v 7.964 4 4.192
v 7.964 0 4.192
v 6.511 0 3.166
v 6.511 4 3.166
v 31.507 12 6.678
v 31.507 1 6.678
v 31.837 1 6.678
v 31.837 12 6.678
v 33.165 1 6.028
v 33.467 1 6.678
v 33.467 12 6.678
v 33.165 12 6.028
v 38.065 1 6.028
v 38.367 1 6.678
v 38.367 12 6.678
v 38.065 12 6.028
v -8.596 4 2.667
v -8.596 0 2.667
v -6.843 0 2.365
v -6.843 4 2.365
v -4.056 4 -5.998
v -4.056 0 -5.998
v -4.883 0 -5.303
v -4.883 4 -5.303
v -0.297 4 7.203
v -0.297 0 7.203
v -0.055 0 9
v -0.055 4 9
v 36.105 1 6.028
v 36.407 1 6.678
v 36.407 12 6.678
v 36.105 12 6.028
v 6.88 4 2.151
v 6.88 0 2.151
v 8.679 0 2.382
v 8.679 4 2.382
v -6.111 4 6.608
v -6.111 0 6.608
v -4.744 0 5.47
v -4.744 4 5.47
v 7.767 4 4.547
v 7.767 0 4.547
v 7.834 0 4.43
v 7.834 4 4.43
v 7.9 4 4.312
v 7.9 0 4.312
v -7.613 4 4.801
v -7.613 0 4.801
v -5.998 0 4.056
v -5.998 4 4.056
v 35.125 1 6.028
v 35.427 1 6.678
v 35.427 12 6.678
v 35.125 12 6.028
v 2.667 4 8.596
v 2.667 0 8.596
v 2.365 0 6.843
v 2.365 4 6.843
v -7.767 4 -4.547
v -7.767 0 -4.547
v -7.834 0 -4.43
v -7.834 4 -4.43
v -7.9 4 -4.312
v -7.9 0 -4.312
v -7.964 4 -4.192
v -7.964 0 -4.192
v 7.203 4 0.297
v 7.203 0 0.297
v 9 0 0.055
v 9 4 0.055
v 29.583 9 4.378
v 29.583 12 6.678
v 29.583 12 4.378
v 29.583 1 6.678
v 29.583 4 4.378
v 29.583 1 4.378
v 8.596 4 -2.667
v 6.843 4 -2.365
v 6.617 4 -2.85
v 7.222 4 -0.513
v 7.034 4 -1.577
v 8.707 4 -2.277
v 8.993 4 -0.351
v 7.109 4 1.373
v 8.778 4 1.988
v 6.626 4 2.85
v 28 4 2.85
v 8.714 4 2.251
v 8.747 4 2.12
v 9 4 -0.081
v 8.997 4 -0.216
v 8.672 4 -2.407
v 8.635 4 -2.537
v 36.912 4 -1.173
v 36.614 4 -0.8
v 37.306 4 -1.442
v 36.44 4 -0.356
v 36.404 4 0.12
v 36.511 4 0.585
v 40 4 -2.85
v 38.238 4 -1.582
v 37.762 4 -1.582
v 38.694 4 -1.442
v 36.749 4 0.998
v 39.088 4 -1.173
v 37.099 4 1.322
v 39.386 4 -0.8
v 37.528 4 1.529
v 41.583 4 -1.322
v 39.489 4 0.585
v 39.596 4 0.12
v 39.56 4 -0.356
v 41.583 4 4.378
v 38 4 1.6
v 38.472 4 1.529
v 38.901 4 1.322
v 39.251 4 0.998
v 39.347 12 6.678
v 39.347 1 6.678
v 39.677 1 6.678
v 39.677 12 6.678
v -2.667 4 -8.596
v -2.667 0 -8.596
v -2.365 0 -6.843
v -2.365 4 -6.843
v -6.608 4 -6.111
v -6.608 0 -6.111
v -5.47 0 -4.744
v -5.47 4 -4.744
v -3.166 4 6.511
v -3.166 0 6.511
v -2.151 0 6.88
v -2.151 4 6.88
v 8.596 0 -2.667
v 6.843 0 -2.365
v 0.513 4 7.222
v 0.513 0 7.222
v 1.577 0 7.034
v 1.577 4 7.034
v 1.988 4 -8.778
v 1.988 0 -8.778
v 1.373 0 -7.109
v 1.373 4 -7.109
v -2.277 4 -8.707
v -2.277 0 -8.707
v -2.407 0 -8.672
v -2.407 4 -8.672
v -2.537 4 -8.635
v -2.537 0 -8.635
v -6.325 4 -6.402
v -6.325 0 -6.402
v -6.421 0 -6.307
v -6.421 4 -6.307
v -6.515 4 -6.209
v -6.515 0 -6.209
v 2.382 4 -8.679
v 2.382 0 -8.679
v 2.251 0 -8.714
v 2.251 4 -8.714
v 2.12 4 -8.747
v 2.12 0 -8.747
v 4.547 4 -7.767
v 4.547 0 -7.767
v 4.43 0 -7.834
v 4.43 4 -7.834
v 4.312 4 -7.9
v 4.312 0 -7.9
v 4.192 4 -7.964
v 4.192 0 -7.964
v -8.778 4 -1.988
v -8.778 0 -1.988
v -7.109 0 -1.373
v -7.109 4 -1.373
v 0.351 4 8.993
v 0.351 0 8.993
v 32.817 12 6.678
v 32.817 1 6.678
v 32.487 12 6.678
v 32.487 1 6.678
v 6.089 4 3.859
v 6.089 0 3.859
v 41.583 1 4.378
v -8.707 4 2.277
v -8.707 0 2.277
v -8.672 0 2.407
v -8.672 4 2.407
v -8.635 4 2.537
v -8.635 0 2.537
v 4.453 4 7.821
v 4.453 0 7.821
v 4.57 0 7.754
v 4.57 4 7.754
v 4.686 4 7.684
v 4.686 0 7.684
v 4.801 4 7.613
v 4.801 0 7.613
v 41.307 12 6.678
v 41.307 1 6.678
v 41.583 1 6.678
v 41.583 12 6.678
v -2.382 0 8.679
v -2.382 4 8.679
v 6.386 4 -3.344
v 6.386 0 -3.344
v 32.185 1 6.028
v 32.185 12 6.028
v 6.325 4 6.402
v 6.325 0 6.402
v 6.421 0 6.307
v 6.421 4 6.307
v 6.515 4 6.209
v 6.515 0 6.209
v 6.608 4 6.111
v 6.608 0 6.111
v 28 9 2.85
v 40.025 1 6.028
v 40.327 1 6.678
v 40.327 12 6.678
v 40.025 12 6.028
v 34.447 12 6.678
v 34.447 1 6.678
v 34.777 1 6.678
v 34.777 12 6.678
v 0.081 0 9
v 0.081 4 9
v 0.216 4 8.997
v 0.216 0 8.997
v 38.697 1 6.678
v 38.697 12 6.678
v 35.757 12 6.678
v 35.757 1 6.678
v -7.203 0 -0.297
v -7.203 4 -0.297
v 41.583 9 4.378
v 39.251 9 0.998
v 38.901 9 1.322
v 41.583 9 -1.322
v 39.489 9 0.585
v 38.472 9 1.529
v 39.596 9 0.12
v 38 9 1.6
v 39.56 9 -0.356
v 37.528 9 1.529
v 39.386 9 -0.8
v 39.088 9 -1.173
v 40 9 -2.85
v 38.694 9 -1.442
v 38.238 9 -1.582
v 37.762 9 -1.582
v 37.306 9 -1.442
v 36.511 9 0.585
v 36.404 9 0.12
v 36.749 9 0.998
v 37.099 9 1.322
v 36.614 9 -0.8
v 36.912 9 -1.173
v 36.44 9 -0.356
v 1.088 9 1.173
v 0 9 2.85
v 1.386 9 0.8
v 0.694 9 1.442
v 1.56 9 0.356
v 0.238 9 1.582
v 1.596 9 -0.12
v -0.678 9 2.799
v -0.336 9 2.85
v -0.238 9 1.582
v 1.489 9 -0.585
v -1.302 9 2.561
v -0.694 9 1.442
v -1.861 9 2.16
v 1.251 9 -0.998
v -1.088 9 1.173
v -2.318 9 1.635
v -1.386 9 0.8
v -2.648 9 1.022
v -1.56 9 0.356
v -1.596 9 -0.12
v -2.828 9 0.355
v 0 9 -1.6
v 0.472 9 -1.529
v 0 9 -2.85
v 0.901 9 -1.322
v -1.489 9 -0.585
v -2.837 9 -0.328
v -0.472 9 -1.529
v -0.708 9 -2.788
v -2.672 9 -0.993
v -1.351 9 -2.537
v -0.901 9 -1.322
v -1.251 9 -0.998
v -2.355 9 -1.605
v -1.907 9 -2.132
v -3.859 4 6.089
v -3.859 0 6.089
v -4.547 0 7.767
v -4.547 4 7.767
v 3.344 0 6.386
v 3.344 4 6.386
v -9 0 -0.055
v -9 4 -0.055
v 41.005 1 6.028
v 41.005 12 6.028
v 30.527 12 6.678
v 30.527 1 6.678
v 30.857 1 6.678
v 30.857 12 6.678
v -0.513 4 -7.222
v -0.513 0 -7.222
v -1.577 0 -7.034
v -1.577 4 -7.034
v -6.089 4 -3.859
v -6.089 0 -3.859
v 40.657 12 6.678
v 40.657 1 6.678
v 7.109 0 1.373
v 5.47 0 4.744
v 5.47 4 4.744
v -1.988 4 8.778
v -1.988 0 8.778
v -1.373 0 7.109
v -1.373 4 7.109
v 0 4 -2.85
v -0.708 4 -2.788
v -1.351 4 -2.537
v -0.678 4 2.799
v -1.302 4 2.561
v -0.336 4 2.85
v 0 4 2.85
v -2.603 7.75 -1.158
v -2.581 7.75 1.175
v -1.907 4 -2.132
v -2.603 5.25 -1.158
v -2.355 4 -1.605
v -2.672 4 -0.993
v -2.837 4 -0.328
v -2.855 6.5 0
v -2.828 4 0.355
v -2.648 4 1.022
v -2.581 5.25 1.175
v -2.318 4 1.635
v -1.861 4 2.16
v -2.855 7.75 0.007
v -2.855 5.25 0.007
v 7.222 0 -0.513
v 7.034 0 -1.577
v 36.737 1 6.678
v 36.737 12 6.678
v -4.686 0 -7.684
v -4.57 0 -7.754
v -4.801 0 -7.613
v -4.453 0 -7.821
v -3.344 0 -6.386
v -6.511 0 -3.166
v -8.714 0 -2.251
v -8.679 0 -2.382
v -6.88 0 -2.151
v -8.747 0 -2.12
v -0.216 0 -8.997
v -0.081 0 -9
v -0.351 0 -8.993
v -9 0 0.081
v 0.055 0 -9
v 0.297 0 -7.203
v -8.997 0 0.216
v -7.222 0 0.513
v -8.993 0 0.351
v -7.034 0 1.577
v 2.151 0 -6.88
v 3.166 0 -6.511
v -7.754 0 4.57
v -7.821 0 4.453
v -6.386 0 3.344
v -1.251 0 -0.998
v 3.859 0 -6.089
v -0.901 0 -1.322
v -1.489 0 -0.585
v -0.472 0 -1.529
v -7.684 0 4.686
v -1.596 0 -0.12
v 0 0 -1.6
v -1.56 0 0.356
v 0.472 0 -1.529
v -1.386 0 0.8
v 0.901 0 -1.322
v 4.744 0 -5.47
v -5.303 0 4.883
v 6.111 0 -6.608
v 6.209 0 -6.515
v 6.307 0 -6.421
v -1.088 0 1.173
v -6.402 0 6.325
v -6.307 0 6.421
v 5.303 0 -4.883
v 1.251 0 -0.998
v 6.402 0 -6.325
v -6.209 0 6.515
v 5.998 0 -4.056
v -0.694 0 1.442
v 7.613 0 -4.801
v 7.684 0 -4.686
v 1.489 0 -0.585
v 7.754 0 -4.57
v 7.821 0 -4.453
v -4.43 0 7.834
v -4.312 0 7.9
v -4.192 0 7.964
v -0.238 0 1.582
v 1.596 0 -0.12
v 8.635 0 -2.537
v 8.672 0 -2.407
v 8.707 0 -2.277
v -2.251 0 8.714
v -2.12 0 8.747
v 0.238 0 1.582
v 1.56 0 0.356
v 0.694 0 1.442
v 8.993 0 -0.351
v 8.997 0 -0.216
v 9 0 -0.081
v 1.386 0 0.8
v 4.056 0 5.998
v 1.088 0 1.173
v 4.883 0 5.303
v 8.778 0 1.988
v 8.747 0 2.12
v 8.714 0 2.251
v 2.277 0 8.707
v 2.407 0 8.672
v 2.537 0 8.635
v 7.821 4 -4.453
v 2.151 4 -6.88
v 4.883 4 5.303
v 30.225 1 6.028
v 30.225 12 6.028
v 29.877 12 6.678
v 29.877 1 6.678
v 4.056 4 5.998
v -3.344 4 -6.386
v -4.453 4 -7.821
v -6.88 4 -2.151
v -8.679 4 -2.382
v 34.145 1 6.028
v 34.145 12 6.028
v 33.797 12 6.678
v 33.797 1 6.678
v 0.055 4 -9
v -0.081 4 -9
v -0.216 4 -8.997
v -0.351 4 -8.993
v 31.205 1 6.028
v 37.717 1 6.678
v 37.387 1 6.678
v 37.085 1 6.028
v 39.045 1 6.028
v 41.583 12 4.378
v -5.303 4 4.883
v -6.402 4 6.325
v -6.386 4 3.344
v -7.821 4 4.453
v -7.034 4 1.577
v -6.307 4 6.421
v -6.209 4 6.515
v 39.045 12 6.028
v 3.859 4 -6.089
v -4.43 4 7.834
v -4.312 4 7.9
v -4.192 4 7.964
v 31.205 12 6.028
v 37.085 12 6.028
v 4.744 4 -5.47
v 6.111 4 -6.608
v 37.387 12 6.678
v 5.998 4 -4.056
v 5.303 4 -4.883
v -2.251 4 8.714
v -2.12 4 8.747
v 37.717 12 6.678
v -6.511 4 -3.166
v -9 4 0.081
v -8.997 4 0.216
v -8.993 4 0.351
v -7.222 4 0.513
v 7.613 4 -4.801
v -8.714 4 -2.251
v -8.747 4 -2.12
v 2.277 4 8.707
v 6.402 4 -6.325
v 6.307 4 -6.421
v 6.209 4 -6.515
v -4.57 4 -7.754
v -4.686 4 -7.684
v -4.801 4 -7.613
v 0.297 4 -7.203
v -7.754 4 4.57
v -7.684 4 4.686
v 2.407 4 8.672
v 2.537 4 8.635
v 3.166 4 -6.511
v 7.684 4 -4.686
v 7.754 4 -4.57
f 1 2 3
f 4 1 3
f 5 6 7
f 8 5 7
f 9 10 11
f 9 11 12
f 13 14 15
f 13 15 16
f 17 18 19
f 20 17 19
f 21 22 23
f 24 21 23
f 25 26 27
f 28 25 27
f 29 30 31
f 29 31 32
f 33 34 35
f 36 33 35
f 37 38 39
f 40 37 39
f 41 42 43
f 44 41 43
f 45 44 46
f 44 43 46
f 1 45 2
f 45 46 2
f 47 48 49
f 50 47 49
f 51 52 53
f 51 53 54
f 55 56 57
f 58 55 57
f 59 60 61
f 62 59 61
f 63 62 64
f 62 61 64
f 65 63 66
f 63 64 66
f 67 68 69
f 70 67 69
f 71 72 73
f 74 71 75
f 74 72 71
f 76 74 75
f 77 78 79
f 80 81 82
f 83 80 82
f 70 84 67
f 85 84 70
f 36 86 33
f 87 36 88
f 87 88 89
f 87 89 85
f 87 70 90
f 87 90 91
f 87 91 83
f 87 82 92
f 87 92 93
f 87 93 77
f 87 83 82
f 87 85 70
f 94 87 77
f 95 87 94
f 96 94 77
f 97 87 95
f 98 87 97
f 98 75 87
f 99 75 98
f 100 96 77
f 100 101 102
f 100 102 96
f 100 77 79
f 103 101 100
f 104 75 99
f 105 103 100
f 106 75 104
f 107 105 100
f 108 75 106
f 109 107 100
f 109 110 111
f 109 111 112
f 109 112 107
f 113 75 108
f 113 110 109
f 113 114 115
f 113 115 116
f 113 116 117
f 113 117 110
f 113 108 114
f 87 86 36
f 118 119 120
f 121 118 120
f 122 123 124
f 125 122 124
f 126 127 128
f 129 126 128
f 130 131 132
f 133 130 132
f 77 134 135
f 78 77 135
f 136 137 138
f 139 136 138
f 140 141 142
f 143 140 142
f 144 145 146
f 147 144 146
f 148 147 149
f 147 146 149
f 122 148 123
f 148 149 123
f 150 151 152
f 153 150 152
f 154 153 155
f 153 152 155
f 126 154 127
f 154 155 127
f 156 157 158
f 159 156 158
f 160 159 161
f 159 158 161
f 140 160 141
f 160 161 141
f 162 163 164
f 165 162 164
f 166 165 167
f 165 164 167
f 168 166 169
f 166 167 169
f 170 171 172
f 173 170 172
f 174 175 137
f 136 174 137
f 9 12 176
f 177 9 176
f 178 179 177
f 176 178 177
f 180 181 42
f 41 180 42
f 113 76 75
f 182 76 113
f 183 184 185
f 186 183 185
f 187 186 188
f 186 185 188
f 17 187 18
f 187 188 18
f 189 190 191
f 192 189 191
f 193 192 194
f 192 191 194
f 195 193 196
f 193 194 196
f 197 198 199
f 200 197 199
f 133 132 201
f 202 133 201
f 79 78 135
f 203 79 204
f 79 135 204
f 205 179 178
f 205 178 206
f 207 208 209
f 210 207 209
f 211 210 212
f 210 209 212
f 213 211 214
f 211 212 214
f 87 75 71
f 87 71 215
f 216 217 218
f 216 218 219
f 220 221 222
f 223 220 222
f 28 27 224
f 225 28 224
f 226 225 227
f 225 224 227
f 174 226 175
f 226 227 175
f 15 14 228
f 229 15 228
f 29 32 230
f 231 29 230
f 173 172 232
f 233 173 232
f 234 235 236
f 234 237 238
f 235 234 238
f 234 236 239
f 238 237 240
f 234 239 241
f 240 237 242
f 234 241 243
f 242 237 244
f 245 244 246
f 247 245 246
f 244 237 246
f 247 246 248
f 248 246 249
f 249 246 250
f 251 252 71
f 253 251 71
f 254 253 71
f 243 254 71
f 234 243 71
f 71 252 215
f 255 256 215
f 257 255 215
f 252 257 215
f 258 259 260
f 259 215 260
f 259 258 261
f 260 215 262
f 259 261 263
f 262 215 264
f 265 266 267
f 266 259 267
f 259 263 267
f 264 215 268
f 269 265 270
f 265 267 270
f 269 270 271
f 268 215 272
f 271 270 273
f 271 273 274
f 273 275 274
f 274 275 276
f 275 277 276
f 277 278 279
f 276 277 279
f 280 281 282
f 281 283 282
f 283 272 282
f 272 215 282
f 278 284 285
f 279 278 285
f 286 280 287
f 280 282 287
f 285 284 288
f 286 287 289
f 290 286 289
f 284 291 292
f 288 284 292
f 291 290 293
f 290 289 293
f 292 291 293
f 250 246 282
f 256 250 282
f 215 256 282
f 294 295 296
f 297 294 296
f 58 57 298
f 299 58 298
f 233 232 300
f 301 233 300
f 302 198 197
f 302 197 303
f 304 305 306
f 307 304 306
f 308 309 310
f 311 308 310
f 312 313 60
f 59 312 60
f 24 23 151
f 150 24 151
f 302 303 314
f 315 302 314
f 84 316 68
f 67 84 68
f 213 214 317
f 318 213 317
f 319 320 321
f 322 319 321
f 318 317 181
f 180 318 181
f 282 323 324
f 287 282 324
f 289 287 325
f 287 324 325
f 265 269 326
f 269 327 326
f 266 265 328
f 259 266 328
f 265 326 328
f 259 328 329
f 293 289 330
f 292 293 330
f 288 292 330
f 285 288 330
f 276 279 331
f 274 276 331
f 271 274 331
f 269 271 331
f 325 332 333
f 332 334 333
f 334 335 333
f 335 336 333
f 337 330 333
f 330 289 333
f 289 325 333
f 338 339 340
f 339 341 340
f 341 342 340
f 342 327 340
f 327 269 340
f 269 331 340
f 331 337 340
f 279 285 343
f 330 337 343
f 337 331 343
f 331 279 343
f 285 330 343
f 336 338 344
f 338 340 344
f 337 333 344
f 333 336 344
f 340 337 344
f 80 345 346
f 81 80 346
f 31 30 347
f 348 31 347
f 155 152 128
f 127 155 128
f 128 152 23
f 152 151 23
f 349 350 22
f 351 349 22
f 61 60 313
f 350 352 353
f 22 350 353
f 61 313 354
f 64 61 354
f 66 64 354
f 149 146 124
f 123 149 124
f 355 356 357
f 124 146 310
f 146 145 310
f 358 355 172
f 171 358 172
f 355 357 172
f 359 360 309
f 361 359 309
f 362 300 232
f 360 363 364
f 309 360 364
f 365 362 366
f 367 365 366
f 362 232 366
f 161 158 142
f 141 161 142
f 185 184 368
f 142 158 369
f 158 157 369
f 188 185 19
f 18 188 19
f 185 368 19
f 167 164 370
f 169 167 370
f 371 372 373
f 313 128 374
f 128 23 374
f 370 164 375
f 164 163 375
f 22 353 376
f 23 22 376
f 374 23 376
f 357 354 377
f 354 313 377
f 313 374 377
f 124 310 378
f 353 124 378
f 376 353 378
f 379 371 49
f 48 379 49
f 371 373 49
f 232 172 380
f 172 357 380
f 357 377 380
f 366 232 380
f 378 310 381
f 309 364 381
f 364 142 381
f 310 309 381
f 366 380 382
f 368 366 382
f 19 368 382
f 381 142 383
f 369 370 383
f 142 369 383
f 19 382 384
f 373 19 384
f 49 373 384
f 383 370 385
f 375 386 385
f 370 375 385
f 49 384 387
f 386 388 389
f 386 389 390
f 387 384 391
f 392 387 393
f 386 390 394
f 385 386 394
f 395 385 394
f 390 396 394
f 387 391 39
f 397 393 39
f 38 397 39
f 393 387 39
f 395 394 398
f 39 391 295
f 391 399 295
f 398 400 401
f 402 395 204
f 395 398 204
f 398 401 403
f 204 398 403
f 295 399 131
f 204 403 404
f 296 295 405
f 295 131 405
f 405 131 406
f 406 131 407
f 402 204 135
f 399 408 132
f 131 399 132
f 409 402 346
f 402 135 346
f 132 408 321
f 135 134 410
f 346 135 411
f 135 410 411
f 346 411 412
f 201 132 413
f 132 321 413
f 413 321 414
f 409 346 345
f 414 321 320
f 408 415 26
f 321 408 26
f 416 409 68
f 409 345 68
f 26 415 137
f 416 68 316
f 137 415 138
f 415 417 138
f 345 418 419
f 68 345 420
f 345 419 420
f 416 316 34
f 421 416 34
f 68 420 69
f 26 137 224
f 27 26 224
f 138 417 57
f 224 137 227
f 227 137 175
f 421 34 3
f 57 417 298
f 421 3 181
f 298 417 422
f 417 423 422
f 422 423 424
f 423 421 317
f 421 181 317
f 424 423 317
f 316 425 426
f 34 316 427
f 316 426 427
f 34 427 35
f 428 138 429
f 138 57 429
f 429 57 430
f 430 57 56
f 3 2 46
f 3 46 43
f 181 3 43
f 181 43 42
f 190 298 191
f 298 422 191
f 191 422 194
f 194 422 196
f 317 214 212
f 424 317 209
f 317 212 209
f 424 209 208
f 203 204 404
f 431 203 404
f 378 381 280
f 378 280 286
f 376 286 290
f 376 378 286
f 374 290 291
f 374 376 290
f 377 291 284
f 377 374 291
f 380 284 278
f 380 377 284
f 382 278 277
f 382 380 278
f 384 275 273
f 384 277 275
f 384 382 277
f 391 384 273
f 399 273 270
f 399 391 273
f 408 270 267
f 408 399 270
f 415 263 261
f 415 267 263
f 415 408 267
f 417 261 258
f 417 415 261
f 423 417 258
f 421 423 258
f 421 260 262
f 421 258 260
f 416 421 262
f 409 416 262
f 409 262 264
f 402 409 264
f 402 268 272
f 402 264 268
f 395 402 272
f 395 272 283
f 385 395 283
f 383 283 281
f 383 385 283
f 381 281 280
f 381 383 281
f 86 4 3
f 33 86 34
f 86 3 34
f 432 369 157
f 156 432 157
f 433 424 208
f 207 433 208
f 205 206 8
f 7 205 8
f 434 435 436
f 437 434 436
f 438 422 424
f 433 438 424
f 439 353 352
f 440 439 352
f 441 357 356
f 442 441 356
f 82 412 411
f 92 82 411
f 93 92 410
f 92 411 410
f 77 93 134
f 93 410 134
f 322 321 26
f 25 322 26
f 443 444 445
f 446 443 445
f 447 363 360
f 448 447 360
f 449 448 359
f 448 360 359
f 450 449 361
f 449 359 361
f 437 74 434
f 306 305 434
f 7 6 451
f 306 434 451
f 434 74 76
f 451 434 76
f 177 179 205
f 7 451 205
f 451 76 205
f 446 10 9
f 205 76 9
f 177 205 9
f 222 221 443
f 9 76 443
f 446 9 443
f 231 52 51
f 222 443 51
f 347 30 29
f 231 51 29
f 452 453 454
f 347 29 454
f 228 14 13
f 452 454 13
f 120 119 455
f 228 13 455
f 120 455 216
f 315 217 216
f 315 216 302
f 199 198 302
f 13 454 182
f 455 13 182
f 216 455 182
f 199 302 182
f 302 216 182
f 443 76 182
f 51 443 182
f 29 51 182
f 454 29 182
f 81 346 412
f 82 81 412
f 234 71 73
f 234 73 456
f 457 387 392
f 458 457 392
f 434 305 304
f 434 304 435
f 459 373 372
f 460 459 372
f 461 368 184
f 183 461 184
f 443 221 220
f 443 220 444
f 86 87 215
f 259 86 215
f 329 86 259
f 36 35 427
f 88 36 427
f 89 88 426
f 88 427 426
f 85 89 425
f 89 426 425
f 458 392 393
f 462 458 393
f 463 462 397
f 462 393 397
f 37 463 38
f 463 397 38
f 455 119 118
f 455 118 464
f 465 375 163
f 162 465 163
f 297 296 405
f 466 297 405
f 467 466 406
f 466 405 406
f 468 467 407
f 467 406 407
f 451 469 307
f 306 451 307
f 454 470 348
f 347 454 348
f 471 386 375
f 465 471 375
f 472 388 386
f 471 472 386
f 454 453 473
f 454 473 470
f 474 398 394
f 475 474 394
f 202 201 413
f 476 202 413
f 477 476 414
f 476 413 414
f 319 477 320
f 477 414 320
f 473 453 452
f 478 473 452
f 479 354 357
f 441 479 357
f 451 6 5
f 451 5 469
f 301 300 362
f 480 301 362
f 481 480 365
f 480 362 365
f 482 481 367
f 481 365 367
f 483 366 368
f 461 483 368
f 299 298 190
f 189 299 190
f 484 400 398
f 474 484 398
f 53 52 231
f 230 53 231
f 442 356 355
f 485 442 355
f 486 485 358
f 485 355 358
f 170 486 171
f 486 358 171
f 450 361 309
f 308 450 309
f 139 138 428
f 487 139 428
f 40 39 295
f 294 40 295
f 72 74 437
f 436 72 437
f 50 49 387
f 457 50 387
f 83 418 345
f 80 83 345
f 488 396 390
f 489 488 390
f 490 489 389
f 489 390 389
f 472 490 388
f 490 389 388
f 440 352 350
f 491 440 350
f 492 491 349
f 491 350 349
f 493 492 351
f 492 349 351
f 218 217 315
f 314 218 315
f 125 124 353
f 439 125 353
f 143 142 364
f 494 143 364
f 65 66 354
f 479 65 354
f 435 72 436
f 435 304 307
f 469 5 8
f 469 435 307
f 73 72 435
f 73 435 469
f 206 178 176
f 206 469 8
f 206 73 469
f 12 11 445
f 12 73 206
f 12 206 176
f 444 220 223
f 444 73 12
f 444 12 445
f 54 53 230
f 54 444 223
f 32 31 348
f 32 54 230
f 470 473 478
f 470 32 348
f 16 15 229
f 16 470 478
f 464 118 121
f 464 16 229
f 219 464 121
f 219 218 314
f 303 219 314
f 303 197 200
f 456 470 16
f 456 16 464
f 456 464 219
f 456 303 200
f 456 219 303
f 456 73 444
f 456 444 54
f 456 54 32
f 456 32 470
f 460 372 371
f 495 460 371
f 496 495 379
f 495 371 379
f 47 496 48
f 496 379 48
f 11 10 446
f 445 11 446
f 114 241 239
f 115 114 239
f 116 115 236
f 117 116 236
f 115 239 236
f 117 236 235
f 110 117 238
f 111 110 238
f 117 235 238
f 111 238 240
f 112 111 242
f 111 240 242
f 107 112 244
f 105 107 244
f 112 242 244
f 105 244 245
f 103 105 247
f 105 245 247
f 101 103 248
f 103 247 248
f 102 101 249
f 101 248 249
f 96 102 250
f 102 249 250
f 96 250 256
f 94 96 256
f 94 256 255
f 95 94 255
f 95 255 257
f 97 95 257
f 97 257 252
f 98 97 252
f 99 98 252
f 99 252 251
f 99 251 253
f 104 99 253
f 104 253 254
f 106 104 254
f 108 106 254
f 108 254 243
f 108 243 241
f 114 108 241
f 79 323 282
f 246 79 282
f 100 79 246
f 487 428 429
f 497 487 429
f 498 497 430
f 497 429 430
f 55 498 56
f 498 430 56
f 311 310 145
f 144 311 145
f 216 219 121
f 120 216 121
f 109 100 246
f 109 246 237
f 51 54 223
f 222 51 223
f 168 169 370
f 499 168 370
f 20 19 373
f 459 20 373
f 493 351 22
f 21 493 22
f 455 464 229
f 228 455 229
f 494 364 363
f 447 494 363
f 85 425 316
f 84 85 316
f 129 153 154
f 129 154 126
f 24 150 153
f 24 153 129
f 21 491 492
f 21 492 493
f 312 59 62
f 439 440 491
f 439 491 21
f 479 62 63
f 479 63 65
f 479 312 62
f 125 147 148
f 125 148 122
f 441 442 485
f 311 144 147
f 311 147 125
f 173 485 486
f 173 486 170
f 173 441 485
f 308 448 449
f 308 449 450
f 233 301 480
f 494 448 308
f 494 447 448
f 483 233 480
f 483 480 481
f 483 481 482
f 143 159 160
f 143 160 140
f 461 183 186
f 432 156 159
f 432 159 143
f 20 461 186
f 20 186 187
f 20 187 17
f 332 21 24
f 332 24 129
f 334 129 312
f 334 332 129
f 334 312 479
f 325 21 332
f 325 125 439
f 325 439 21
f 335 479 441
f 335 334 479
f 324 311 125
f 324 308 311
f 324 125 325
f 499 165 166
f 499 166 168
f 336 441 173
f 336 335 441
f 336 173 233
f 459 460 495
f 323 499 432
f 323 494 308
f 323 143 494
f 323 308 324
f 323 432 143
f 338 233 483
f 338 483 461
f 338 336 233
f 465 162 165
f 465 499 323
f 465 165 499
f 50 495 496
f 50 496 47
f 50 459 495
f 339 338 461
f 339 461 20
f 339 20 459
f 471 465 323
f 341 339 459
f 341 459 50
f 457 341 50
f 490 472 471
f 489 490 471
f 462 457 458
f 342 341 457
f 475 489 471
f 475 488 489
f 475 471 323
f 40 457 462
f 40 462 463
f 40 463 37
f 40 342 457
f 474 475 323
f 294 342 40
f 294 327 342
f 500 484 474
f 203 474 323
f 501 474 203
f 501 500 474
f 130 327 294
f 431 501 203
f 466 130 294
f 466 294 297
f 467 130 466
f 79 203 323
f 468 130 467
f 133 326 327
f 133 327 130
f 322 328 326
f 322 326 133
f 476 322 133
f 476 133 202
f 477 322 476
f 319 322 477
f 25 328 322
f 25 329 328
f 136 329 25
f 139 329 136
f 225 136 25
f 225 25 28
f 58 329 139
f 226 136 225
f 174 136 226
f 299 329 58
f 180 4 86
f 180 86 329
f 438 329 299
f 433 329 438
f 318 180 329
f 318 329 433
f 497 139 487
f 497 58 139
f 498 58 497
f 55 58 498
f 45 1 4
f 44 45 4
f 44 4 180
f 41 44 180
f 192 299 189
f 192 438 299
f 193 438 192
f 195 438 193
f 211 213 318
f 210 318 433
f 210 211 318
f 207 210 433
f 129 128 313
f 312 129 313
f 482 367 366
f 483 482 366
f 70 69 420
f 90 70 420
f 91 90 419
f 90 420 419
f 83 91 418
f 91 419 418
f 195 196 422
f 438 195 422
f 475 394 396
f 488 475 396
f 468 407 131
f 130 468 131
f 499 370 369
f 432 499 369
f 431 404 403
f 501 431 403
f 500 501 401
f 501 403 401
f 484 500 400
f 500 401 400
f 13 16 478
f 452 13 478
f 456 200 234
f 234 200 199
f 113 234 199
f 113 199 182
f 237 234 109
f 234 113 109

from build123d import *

# Parameters (mm, degrees)
ESQUISSE1_R                  = 9
BOSS_EXTRU_1_DEPTH           = 4
BOSS_EXTRU_2_DEPTH           = 5
ENL_V_MAT_EXTRU_1_DEPTH      = 4
ENL_V_MAT_EXTRU_2_DEPTH      = 3
ENL_V_MAT_EXTRU_2_DEPTH_BACK = 12
ESQUISSE4_R                  = 1.6
BOSS_EXTRU_3_DEPTH           = 3
BOSS_EXTRU_3_DEPTH_BACK      = 8
ESQUISSE5_W                  = 12
ESQUISSE5_H                  = 2.3
ENL_V_MAT_EXTRU_3_DEPTH      = 11
ESQUISSE7_R                  = 1.6
ENL_V_MAT_EXTRU_4_DEPTH      = 11


with BuildPart() as part:
    # Esquisse1 → Boss.-Extru.1 (new body)
    with BuildSketch(Plane(origin=(0, 0, 0), x_dir=(1, 0, 0), z_dir=(0, 1, 0))):
        with Locations(Location((0, 0, 0), (0, 0, 270))):
            Circle(ESQUISSE1_R)
    extrude(amount=BOSS_EXTRU_1_DEPTH)

    # Esquisse2 → Boss.-Extru.2 (add)
    with BuildSketch(Plane(origin=(0, 4, 0), x_dir=(1, 0, 0), z_dir=(0, 1, 0))):
        with BuildLine():
            Line((0, 2.85), (28, 2.85))
            Line((28, 2.85), (40, 2.85))
            Line((40, 2.85), (41.582547561, 1.321751585))
            Line((41.582547561, 1.321751585), (41.582547561, -6.678248415))
            Line((41.582547561, -6.678248415), (29.582547561, -6.678248415))
            Line((29.582547561, -6.678248415), (29.582547561, -4.378248415))
            Line((29.582547561, -4.378248415), (28, -2.85))
            Line((28, -2.85), (0, -2.85))
            add(Edge.make_bspline(
                [(0, 2.85), (-1.583763235, 2.944784931), (-4.146375178, 0.014422281), (-1.543874763, -2.966253476), (0, -2.85)],
                knots=[0, 0, 0, 0, 0.500311959, 1, 1, 1, 1], degree=3))
        make_face()
    extrude(amount=BOSS_EXTRU_2_DEPTH)

    # Esquisse3 → Enlèv. mat.-Extru.1 (cut)
    with BuildSketch(Plane.XZ):
        Polygon((0.351449311, 8.993135348), (0.513444021, 7.221842901), (1.577304258, 7.034102859), (2.276601179, 8.707300791), (1.416805586, 9.582955874), align=None)
        Polygon((3.344118704, 6.386185235), (4.452643151, 7.821378969), (3.848780595, 8.889728302), (2.667068669, 8.595739917), (2.365099324, 6.84287548), align=None)
        Polygon((4.883036987, 5.30305964), (6.325244851, 6.402443094), (6.018467567, 7.590680437), (4.800931705, 7.612559016), (4.055577016, 5.997577404), align=None)
        Polygon((6.089184369, 3.858539294), (7.766791567, 4.547191304), (7.77800592, 5.774340245), (6.607619179, 6.110594798), (5.469673837, 4.743554339), align=None)
        Polygon((6.880363898, 2.151065872), (8.679044273, 2.382055941), (9.007486024, 3.564488307), (7.964008326, 4.192203643), (6.511021425, 3.166265885), align=None)
        Polygon((7.202657999, 0.297000866), (8.999834455, 0.054587401), (9.62312084, 1.111722382), (8.777663467, 1.988120738), (7.108653663, 1.373201643), align=None)
        Polygon((7.034102859, -1.577304258), (8.707300791, -2.276601179), (9.582955874, -1.416805586), (8.993135348, -0.351449311), (7.221842901, -0.513444021), align=None)
        Polygon((6.386185235, -3.344118704), (7.821378969, -4.452643151), (8.889728302, -3.848780595), (8.595739917, -2.667068669), (6.84287548, -2.365099324), align=None)
        Polygon((5.30305964, -4.883036987), (6.402443094, -6.325244851), (7.590680437, -6.018467567), (7.612559016, -4.800931705), (5.997577404, -4.055577016), align=None)
        Polygon((3.858539294, -6.089184369), (4.547191304, -7.766791567), (5.774340245, -7.77800592), (6.110594798, -6.607619179), (4.743554339, -5.469673837), align=None)
        Polygon((2.151065872, -6.880363898), (2.382055941, -8.679044273), (3.564488307, -9.007486024), (4.192203643, -7.964008326), (3.166265885, -6.511021425), align=None)
        Polygon((0.297000866, -7.202657999), (0.054587401, -8.999834455), (1.111722382, -9.62312084), (1.988120738, -8.777663467), (1.373201643, -7.108653663), align=None)
        Polygon((-1.577304258, -7.034102859), (-2.276601179, -8.707300791), (-1.416805586, -9.582955874), (-0.351449311, -8.993135348), (-0.513444021, -7.221842901), align=None)
        Polygon((-3.344118704, -6.386185235), (-4.452643151, -7.821378969), (-3.848780595, -8.889728302), (-2.667068669, -8.595739917), (-2.365099324, -6.84287548), align=None)
        Polygon((-4.883036987, -5.30305964), (-6.325244851, -6.402443094), (-6.018467567, -7.590680437), (-4.800931705, -7.612559016), (-4.055577016, -5.997577404), align=None)
        Polygon((-6.089184369, -3.858539294), (-7.766791567, -4.547191304), (-7.77800592, -5.774340245), (-6.607619179, -6.110594798), (-5.469673837, -4.743554339), align=None)
        Polygon((-6.880363898, -2.151065872), (-8.679044273, -2.382055941), (-9.007486024, -3.564488307), (-7.964008326, -4.192203643), (-6.511021425, -3.166265885), align=None)
        Polygon((-7.202657999, -0.297000866), (-8.999834455, -0.054587401), (-9.62312084, -1.111722382), (-8.777663467, -1.988120738), (-7.108653663, -1.373201643), align=None)
        Polygon((-7.034102859, 1.577304258), (-8.707300791, 2.276601179), (-9.582955874, 1.416805586), (-8.993135348, 0.351449311), (-7.221842901, 0.513444021), align=None)
        Polygon((-6.386185235, 3.344118704), (-7.821378969, 4.452643151), (-8.889728302, 3.848780595), (-8.595739917, 2.667068669), (-6.84287548, 2.365099324), align=None)
        Polygon((-5.30305964, 4.883036987), (-6.402443094, 6.325244851), (-7.590680437, 6.018467567), (-7.612559016, 4.800931705), (-5.997577404, 4.055577016), align=None)
        Polygon((-3.858539294, 6.089184369), (-4.547191304, 7.766791567), (-5.774340245, 7.77800592), (-6.110594798, 6.607619179), (-4.743554339, 5.469673837), align=None)
        Polygon((-2.151065872, 6.880363898), (-2.382055941, 8.679044273), (-3.564488307, 9.007486024), (-4.192203643, 7.964008326), (-3.166265885, 6.511021425), align=None)
        Polygon((-0.297000866, 7.202657999), (-0.054587401, 8.999834455), (-1.111722382, 9.62312084), (-1.988120738, 8.777663467), (-1.373201643, 7.108653663), align=None)
    extrude(amount=-ENL_V_MAT_EXTRU_1_DEPTH, mode=Mode.SUBTRACT)

    # Esquisse4 → Enlèv. mat.-Extru.2 (cut, two sides: drawn at the far end of the back side and taken through both)
    with BuildSketch(Plane(origin=(0, 9, 0), x_dir=(1, 0, 0), z_dir=(0, 1, 0)).offset(-ENL_V_MAT_EXTRU_2_DEPTH_BACK)):
        with Locations(Location((0, 0, 0), (0, 0, 90))):
            Circle(ESQUISSE4_R)
    extrude(amount=ENL_V_MAT_EXTRU_2_DEPTH + ENL_V_MAT_EXTRU_2_DEPTH_BACK, mode=Mode.SUBTRACT)

    # Esquisse5 → Boss.-Extru.3 (add, two sides: drawn at the far end of the back side and taken through both)
    with BuildSketch(Plane(origin=(0, 9, 0), x_dir=(1, 0, 0), z_dir=(0, 1, 0)).offset(-BOSS_EXTRU_3_DEPTH_BACK)):
        with Locations((35.582547561, -5.528248415)):
            Rectangle(ESQUISSE5_W, ESQUISSE5_H)
    extrude(amount=BOSS_EXTRU_3_DEPTH + BOSS_EXTRU_3_DEPTH_BACK)

    # Esquisse6 → Enlèv. mat.-Extru.3 (cut)
    with BuildSketch(Plane(origin=(0, 12, 0), x_dir=(1, 0, 0), z_dir=(0, 1, 0))):
        Polygon((41.30726734, -6.678248415), (41.004659891, -6.028248415), (40.65726734, -6.678248415), (41.004659891, -7.030774788), align=None)
        Polygon((40.32726734, -6.678248415), (40.024659891, -6.028248415), (39.67726734, -6.678248415), (40.024659891, -7.030774788), align=None)
        Polygon((39.34726734, -6.678248415), (39.044659891, -6.028248415), (38.69726734, -6.678248415), (39.044659891, -7.030774788), align=None)
        Polygon((38.36726734, -6.678248415), (38.064659891, -6.028248415), (37.71726734, -6.678248415), (38.064659891, -7.030774788), align=None)
        Polygon((37.38726734, -6.678248415), (37.084659891, -6.028248415), (36.73726734, -6.678248415), (37.084659891, -7.030774788), align=None)
        Polygon((36.40726734, -6.678248415), (36.104659891, -6.028248415), (35.75726734, -6.678248415), (36.104659891, -7.030774788), align=None)
        Polygon((35.42726734, -6.678248415), (35.124659891, -6.028248415), (34.77726734, -6.678248415), (35.124659891, -7.030774788), align=None)
        Polygon((34.44726734, -6.678248415), (34.144659891, -6.028248415), (33.79726734, -6.678248415), (34.144659891, -7.030774788), align=None)
        Polygon((33.46726734, -6.678248415), (33.164659891, -6.028248415), (32.81726734, -6.678248415), (33.164659891, -7.030774788), align=None)
        Polygon((32.48726734, -6.678248415), (32.184659891, -6.028248415), (31.83726734, -6.678248415), (32.184659891, -7.030774788), align=None)
        Polygon((31.50726734, -6.678248415), (31.204659891, -6.028248415), (30.85726734, -6.678248415), (31.204659891, -7.030774788), align=None)
        Polygon((30.52726734, -6.678248415), (30.224659891, -6.028248415), (29.87726734, -6.678248415), (30.224659891, -7.030774788), align=None)
    extrude(amount=-ENL_V_MAT_EXTRU_3_DEPTH, mode=Mode.SUBTRACT)

    # Esquisse7 → Enlèv. mat.-Extru.4 (cut)
    with BuildSketch(Plane(origin=(0, 9, 0), x_dir=(1, 0, 0), z_dir=(0, 1, 0))):
        with Locations(Location((38, 0, 0), (0, 0, 270))):
            Circle(ESQUISSE7_R)
    extrude(amount=-ENL_V_MAT_EXTRU_4_DEPTH, mode=Mode.SUBTRACT)


solid = part.part
